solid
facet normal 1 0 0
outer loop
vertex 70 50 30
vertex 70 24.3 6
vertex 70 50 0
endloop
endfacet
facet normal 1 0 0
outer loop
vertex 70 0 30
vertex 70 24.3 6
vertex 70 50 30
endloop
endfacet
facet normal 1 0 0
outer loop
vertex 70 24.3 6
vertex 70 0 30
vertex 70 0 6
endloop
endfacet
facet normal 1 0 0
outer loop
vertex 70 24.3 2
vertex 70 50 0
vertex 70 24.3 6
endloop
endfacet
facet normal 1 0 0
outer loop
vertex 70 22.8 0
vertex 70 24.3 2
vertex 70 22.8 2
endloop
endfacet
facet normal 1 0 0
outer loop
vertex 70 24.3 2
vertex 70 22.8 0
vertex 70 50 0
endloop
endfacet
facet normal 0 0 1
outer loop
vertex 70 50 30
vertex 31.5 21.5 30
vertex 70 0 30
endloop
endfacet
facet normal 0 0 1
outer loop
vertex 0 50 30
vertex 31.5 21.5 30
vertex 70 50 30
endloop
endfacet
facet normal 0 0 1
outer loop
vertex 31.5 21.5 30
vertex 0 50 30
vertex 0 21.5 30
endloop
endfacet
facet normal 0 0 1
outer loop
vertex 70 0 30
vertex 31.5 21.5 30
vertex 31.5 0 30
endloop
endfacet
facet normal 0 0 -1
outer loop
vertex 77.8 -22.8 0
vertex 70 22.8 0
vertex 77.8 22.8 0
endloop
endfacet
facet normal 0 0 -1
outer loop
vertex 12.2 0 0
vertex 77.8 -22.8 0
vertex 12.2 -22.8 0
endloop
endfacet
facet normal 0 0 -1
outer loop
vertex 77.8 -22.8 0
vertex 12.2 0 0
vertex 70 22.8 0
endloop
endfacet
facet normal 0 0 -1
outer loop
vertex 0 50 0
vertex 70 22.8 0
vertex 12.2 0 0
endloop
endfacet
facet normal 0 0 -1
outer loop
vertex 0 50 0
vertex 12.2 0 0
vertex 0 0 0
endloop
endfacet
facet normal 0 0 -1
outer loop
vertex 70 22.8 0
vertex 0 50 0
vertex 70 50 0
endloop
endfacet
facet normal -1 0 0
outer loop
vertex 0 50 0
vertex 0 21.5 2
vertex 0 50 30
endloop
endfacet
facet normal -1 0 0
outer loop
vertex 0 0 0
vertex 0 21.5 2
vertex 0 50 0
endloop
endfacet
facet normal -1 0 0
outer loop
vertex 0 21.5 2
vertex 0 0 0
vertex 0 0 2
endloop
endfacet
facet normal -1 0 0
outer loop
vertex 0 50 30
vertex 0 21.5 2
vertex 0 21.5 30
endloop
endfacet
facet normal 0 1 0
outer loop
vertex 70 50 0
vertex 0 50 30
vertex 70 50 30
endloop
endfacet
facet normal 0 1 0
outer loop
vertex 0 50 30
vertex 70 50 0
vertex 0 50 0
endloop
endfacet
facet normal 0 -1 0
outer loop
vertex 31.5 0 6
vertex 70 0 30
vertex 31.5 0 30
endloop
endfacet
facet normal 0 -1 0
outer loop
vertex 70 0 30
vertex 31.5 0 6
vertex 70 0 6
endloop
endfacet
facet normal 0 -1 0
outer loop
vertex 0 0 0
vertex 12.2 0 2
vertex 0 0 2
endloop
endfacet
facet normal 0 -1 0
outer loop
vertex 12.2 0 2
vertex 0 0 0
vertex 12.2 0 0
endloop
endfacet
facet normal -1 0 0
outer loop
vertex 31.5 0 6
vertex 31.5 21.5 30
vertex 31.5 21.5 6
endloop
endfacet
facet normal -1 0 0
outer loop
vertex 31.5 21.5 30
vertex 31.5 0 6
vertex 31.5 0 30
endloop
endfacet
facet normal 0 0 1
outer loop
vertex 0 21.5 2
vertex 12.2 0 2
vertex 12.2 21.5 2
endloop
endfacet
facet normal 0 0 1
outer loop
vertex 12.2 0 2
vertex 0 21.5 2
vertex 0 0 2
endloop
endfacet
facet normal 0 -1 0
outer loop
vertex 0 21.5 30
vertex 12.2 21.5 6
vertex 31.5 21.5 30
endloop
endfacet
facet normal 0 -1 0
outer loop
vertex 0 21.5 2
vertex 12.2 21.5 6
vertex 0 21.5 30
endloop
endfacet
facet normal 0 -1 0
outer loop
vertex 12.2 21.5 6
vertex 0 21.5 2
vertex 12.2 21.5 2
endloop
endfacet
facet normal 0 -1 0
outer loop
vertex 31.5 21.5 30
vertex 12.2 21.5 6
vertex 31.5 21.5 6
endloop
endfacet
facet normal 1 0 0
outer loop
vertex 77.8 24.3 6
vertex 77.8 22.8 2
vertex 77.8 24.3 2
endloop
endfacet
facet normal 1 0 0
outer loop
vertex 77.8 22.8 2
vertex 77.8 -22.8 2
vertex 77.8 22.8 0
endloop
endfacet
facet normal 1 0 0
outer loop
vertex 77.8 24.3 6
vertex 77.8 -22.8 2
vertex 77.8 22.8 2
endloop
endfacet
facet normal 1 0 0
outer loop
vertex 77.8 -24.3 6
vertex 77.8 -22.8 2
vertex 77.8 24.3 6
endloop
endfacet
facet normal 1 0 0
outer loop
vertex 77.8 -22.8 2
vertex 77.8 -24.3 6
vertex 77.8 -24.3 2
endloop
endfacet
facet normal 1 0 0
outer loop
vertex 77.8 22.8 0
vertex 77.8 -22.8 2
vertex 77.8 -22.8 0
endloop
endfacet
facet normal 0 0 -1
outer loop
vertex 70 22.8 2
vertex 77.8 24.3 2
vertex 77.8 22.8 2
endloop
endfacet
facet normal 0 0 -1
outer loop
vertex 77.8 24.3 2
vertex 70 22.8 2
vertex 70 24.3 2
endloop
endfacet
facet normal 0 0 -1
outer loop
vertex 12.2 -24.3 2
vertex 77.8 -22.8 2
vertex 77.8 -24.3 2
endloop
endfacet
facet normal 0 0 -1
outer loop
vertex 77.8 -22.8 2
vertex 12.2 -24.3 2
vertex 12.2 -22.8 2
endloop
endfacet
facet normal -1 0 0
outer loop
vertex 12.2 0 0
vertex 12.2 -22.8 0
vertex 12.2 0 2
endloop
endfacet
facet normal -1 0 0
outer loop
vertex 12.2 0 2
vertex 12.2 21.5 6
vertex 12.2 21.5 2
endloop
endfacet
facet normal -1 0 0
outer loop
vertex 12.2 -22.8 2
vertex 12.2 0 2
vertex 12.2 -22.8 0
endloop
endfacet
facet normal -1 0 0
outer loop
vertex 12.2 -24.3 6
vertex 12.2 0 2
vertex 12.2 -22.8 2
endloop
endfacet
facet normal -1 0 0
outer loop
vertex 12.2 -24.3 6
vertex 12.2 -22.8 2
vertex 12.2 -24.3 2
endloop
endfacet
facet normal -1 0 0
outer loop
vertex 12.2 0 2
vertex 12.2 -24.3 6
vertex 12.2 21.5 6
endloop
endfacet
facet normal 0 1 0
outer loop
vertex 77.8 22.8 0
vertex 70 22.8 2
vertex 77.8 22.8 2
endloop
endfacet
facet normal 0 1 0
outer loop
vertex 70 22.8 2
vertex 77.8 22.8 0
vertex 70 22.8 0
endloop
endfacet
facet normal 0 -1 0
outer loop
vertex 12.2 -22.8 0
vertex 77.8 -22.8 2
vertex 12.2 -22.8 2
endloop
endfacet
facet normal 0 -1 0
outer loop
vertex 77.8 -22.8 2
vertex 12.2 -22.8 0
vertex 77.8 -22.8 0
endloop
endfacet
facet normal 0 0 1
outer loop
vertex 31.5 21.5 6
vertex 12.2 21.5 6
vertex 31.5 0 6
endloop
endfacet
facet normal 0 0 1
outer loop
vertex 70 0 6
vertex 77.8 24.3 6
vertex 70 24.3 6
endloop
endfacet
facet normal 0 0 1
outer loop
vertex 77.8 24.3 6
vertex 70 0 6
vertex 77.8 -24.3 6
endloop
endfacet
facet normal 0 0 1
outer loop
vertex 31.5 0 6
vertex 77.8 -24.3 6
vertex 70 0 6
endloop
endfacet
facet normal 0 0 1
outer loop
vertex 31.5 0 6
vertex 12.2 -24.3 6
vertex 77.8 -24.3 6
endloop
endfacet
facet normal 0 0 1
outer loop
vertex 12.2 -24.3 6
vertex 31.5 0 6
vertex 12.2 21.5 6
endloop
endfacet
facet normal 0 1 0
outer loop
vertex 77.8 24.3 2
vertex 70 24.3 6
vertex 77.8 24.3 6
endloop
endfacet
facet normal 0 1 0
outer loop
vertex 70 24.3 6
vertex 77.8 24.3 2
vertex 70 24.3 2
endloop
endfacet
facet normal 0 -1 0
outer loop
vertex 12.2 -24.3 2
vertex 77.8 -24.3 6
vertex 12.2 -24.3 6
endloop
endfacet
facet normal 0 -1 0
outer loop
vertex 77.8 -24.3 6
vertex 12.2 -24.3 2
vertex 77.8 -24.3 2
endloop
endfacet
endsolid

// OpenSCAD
// Two-part enclosure for small electronics board (e.g., Arduino-based logger)
// Print orientation: both parts on the bed (z = 0), building upward (+Z)
// Placed side by side with a 10 mm gap, so they print together

// ---------------- Parameters ----------------
box_x      = 70;    // Box outer size in X (mm)
box_y      = 50;    // Box outer size in Y (mm)
box_z      = 30;    // Box outer size in Z (mm)
box_wall   = 2;     // Box wall thickness (mm)
box_floor  = 2;     // Box floor thickness (mm)

lip_w      = 65.6;  // Lid lip outer size in X (mm)
lip_d      = 45.6;  // Lid lip outer size in Y (mm)
lip_h      = 4;     // Lid lip height above plate (mm)
lip_t      = 1.5;   // Lid lip wall thickness (mm)

plate_t    = 2;     // Lid plate thickness (mm)

gap        = 10;    // Gap between box and lid (mm)

eps        = 0.5;   // Overcut for clean boolean differences (mm)

$fn = 64;           // Curve resolution (no curved features here, set per rules)

// ---------------- Derived ----------------
lip_y2d    = lip_d + 2 * lip_t;   // Lip outer size in Y including walls
box_int_w  = box_x - 2 * box_wall; // Box inner width (opening in X)
box_int_d  = box_y - 2 * box_wall;   // Box opening in Y (same as wall thickness)

// ---------------- Modules ----------------
module box() {
    // Open-top box: full outer block with a hollowed-out top section
    difference() {
        cube([box_x, box_y, box_z]);
        // Cut from the top face down to below the floor
        translate([
            -box_x / 2 - eps,
            -box_y / 2 - eps,
            box_floor
        ])
        cube([
            box_int_w + 2 * eps,
            box_int_d + 2 * eps,
            box_z - box_floor
        ]);
    }
}

module lid() {
    // Lid printed upside down: a plate on the bed with a rectangular lip
    // The lip slides into the box opening with 0.2 mm clearance on each side
    union() {
        // Base plate
        translate([-lip_w / 2, -lip_d / 2, 0])
        cube([lip_w, lip_d, plate_t]);

        // Lip on top of the plate
        translate([-lip_w / 2, -lip_y2d / 2, plate_t])
        cube([lip_w, lip_y2d, lip_h]);
    }
}

// ---------------- Assembly ----------------
union() {
    box();          // Part 1: the open-top box
    translate([box_x / 2 + gap, 0, 0])
    lid();          // Part 2: the lid, on the +X side of the box
}
